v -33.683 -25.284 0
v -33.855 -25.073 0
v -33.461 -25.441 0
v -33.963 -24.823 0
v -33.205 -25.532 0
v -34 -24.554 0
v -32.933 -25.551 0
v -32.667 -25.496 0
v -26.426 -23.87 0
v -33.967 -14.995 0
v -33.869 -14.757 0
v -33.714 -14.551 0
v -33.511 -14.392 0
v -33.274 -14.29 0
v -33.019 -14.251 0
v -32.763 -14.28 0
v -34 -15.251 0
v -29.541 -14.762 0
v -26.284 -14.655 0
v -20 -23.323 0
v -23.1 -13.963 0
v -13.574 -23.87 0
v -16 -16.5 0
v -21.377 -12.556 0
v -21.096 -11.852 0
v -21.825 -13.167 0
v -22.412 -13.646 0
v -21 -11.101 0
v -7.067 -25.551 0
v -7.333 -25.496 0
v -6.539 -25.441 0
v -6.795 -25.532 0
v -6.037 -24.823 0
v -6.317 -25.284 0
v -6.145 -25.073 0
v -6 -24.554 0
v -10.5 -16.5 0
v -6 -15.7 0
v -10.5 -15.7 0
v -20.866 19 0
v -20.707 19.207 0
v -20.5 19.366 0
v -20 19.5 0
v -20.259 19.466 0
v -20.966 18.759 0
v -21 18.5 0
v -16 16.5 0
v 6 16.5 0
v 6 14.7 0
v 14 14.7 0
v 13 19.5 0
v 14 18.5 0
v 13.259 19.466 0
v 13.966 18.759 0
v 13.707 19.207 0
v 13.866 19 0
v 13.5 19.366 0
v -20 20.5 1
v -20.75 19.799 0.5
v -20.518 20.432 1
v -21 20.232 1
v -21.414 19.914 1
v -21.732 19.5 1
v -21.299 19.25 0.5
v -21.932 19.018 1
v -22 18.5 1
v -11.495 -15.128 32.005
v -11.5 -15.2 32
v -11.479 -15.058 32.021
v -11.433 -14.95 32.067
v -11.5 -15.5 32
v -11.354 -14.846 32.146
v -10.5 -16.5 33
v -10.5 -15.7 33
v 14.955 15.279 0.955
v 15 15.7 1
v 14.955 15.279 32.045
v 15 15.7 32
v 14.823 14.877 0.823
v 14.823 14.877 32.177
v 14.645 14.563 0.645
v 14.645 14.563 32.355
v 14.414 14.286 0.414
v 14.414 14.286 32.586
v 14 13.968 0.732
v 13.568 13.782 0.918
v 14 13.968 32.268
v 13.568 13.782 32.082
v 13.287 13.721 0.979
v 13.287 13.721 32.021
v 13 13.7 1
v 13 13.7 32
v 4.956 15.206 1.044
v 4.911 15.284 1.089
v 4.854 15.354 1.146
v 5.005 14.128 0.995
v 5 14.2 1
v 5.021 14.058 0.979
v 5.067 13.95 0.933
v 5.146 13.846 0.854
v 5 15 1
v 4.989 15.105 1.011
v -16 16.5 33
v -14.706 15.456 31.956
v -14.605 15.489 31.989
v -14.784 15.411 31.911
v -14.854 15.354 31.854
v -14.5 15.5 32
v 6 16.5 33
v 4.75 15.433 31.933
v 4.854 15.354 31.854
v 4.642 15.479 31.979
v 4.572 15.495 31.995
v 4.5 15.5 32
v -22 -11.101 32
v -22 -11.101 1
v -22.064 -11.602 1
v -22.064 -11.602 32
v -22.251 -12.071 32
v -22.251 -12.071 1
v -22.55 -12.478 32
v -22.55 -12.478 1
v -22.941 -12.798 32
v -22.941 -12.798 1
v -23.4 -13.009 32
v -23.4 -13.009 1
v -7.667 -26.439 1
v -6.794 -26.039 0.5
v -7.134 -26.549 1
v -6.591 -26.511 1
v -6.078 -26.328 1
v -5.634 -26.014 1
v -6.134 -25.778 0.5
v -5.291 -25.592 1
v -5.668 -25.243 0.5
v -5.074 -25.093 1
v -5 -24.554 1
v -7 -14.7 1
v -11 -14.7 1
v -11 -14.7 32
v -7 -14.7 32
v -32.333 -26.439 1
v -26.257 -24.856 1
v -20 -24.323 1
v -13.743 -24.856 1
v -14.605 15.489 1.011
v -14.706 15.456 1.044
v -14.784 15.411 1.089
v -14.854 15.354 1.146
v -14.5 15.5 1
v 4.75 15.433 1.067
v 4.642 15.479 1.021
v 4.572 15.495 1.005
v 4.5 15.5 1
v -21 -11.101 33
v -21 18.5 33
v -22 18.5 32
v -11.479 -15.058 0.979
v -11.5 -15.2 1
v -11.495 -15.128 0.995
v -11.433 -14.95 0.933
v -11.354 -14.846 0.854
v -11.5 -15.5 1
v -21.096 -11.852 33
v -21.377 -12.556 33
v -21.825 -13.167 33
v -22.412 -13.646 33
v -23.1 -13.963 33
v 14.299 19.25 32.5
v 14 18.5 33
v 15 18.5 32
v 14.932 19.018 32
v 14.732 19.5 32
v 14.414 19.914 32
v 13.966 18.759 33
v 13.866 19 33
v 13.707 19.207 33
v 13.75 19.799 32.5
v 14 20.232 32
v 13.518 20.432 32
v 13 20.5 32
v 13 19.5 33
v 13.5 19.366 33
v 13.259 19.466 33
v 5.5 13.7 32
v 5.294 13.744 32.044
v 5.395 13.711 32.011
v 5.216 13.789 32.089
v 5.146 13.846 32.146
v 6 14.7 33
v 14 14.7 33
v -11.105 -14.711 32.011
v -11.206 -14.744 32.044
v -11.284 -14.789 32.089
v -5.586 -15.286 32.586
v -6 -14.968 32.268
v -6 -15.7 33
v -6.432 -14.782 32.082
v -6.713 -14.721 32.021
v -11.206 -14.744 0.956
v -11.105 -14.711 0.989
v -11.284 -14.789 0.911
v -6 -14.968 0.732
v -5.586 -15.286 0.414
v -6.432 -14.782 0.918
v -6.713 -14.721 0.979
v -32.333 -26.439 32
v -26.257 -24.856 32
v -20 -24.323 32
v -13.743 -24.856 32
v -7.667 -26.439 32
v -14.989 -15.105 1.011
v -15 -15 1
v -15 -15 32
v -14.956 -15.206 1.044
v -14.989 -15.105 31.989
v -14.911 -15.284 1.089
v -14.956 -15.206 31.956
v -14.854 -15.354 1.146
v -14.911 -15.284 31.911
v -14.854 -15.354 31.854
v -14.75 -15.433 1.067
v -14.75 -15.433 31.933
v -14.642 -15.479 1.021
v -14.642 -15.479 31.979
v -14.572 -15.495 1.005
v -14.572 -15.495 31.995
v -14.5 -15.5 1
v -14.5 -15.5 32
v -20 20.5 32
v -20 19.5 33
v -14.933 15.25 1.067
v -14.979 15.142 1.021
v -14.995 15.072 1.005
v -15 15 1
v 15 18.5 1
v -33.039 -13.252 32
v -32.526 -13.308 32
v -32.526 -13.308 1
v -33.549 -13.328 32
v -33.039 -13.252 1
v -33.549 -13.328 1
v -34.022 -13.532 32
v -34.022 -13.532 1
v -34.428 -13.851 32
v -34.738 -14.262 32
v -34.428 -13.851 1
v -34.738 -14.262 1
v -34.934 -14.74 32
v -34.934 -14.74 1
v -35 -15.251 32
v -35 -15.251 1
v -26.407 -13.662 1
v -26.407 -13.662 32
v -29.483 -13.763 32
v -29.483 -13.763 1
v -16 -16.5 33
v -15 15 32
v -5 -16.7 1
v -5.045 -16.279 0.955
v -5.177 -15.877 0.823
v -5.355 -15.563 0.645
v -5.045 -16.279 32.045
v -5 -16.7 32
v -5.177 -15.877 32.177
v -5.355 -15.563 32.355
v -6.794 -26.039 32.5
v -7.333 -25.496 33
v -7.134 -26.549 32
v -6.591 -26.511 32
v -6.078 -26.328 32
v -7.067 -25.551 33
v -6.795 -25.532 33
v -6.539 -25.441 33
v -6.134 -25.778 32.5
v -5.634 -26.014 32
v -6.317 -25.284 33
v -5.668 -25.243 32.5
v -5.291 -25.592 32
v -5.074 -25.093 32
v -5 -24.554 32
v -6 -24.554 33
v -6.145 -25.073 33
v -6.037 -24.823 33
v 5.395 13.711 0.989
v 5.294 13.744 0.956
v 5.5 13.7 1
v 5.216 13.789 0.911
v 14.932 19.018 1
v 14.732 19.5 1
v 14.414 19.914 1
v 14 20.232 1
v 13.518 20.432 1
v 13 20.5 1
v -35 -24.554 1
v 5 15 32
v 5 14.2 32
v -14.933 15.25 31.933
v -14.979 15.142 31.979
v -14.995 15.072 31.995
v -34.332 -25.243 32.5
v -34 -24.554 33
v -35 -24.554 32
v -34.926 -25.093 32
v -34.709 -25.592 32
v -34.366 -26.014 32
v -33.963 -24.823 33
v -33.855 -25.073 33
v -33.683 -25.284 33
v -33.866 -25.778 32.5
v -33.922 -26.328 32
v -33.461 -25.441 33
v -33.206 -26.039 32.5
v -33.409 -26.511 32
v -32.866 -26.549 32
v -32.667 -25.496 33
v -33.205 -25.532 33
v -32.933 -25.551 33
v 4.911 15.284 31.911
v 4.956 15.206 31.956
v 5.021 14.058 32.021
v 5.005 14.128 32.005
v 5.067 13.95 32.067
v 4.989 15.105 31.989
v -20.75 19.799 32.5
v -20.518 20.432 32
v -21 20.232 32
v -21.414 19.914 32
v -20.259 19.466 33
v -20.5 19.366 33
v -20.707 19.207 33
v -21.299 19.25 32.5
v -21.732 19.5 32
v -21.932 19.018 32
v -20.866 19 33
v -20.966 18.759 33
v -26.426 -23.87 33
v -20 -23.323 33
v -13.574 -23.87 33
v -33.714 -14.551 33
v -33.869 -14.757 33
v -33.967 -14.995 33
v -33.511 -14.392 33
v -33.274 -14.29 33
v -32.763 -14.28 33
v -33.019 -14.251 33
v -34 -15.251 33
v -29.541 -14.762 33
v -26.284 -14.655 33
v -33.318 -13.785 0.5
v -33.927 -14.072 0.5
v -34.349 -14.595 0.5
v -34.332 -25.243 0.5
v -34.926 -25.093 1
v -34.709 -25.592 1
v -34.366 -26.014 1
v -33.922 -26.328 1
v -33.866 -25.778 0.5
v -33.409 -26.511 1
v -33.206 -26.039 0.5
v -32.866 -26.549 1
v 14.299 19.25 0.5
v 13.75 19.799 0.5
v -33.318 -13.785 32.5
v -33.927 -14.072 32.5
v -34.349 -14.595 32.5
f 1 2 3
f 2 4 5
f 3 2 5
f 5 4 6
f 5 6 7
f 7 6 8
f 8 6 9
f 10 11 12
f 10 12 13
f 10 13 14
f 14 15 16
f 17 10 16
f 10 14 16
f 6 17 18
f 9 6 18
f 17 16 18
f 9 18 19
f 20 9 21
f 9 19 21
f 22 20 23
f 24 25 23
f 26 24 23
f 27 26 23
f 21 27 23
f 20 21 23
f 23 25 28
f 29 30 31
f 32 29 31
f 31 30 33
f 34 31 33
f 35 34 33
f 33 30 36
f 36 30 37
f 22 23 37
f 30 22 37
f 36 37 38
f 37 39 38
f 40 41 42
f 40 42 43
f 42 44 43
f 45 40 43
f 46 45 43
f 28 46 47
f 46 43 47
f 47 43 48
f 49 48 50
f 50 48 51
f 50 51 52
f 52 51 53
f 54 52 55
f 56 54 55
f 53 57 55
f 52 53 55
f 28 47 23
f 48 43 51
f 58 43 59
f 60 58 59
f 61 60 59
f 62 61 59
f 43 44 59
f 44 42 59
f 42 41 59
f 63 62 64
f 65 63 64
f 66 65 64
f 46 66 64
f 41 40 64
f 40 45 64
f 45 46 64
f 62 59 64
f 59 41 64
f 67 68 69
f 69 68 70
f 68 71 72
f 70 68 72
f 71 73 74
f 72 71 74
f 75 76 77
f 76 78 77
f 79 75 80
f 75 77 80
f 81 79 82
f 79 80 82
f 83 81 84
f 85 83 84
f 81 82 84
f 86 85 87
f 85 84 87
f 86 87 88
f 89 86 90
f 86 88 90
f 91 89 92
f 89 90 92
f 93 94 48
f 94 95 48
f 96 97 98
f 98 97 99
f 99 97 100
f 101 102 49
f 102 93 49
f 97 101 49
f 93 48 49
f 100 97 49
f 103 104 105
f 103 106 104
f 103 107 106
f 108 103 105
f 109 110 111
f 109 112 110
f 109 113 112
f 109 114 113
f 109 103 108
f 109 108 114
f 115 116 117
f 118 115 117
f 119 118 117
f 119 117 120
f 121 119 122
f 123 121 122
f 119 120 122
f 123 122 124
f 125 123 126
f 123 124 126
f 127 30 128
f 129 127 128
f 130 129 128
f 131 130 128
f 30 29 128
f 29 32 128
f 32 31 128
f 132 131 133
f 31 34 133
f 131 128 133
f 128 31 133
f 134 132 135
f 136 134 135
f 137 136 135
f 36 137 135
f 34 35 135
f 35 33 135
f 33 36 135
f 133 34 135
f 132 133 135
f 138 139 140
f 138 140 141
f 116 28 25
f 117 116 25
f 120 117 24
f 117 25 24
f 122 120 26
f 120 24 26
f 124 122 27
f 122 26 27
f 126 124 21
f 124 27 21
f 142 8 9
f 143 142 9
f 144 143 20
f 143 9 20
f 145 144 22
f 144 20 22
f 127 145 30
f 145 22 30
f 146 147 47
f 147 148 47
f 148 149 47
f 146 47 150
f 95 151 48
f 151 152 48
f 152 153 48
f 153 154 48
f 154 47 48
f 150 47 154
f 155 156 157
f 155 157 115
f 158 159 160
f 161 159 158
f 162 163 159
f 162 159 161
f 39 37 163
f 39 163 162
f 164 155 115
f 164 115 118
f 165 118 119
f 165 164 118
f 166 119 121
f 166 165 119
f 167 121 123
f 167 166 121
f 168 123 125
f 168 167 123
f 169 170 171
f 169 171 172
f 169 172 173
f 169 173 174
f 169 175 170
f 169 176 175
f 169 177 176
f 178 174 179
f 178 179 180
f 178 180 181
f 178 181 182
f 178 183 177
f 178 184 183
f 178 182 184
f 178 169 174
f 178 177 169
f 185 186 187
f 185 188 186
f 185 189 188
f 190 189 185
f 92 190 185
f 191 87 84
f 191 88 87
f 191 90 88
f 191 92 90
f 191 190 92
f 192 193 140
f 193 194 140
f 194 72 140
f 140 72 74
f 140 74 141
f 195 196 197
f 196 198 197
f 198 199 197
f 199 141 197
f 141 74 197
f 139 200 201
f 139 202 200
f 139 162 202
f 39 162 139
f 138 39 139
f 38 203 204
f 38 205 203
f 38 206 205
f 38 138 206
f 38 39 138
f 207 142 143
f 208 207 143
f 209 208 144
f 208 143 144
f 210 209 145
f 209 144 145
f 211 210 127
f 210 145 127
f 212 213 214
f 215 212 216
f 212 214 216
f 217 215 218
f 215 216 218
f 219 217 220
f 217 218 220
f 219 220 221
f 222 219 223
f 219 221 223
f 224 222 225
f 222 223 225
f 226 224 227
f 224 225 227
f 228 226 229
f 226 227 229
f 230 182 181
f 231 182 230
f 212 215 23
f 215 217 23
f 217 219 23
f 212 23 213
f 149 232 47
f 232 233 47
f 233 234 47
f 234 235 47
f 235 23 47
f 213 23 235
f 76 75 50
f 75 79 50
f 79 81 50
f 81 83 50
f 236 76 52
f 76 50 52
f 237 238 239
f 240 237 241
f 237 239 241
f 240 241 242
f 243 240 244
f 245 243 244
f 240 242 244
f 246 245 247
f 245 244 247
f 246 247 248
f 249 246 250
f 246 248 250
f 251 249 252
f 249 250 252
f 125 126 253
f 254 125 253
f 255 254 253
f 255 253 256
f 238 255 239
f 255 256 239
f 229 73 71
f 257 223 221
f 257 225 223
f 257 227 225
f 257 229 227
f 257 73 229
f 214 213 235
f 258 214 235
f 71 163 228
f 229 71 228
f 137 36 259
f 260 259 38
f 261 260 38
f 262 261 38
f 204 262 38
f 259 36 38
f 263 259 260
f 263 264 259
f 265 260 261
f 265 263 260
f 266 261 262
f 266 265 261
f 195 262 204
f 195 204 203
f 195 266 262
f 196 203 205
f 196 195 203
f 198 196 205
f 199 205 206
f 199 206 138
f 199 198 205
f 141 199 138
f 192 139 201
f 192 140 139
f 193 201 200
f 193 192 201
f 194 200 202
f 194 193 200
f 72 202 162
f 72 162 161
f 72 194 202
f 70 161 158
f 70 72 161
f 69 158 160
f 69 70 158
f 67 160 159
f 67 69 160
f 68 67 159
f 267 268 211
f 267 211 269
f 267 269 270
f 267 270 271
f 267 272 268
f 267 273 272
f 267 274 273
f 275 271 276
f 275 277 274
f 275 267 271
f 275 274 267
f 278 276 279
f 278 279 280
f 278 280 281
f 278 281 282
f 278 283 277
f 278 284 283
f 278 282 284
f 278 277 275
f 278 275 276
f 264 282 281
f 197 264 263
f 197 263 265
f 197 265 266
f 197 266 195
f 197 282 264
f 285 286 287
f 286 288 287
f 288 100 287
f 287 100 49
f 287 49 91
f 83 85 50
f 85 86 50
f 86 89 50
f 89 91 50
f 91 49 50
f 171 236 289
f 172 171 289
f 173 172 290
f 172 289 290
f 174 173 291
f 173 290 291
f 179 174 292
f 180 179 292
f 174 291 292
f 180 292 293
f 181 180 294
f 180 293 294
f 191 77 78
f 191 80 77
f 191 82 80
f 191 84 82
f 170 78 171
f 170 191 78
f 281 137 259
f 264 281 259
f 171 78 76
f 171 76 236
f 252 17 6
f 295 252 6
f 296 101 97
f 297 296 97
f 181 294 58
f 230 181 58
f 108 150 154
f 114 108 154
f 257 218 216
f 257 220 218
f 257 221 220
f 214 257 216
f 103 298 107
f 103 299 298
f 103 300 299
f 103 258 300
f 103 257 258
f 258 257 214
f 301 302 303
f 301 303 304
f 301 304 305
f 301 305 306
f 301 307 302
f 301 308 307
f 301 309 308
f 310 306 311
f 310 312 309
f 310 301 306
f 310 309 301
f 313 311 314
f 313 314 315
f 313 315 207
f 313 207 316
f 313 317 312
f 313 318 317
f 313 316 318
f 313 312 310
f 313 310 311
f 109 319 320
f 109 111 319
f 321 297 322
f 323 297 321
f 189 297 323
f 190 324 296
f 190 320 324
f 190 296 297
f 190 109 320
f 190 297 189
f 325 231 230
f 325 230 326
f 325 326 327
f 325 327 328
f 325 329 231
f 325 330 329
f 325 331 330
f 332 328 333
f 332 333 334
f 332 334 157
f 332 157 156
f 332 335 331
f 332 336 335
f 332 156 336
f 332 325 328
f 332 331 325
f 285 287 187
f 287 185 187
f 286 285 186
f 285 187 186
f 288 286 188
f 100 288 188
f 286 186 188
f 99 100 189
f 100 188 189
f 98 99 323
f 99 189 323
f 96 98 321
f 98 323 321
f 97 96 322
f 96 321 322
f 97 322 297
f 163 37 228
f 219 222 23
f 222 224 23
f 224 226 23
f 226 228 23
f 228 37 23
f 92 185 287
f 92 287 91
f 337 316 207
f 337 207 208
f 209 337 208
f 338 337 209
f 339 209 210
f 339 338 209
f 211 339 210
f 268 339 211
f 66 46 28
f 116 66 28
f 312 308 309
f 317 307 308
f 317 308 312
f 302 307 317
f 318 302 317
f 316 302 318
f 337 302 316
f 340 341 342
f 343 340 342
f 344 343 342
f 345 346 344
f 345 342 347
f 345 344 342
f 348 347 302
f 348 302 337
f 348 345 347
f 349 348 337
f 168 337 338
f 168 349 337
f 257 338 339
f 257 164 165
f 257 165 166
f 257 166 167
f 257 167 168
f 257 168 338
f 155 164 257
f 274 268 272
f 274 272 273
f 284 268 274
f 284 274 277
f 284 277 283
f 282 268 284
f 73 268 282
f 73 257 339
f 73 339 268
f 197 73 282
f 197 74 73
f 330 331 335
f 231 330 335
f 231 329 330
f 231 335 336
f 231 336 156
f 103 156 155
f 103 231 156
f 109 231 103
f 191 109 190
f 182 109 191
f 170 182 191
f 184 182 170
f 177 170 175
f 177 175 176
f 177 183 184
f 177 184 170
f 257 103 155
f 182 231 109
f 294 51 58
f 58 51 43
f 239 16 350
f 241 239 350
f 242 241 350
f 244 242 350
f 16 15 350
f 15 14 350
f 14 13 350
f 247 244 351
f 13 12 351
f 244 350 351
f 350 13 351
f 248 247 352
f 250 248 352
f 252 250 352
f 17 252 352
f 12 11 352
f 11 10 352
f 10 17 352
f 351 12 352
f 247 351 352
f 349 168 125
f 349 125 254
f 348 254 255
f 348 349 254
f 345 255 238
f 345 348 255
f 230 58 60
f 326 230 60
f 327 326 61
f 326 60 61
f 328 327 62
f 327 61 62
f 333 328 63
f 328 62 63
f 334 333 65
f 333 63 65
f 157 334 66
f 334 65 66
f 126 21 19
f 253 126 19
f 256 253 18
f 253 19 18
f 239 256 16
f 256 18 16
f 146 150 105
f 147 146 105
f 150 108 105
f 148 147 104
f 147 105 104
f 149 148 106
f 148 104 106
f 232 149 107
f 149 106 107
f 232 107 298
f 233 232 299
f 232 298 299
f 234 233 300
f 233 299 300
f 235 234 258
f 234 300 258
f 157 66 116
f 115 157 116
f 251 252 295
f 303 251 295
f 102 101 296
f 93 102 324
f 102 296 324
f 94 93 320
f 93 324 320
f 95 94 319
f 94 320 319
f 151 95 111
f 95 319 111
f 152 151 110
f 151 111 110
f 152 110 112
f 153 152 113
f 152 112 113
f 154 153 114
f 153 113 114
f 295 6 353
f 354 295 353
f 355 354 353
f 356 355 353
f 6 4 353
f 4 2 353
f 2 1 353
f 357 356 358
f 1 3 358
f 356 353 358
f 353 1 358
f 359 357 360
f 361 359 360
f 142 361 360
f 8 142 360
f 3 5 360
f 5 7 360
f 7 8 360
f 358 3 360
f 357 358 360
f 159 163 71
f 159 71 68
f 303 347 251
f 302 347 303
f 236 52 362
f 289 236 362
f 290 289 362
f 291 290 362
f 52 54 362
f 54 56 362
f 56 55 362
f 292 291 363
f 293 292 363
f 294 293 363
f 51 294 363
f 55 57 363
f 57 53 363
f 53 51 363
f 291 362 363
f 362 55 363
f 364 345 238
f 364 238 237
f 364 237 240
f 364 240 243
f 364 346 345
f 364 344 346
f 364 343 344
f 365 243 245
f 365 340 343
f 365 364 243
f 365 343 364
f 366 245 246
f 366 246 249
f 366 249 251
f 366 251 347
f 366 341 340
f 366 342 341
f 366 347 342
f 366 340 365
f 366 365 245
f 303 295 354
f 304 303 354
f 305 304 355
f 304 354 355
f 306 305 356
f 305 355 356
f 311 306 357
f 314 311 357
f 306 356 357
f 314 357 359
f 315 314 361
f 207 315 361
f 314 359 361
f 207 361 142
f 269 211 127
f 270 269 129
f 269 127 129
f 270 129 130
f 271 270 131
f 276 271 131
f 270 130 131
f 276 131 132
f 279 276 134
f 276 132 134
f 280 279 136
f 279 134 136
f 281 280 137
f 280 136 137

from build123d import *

# Parameters (mm, degrees)
F0_W     = 6.5
F0_H     = 0.8
F1_DEPTH = 33
F2_SIZE  = 1
F3_R     = 2
F4_R     = 0.5


with BuildPart() as f1:
    # F0 (on Top) → F1 (new body)
    with BuildSketch(Plane.XY):
        with BuildLine():
            Line((-5, -24.553516), (-5, -15.5))
            Line((-5, -15.5), (-11.5, -15.5))
            Line((-11.5, -15.5), (-15, -15.5))
            Line((-15, -15.5), (-15, 15.5))
            Line((-15, 15.5), (5, 15.5))
            Line((5, 15.5), (5, 13.7))
            Line((5, 13.7), (15, 13.7))
            Line((15, 13.7), (15, 15.5))
            Line((15, 15.5), (15, 18.5))
            ThreePointArc((15, 18.5), (14.414214, 19.914214), (13, 20.5))
            Line((13, 20.5), (-20, 20.5))
            ThreePointArc((-20, 20.5), (-21.414214, 19.914214), (-22, 18.5))
            Line((-22, 18.5), (-22, -11.10081))
            ThreePointArc((-22, -11.10081), (-22.387548, -12.284026), (-23.4, -13.008688))
            ThreePointArc((-23.4, -13.008688), (-27.942683, -13.782584), (-32.526316, -13.308041))
            ThreePointArc((-32.526316, -13.308041), (-34.235442, -13.678342), (-35, -15.251137))
            Line((-35, -15.251137), (-35, -18.432774))
            Line((-35, -18.432774), (-35, -24.553516))
            ThreePointArc((-35, -24.553516), (-34.154701, -26.18651), (-32.333333, -26.439135))
            ThreePointArc((-32.333333, -26.439135), (-20, -24.323069), (-7.666667, -26.439135))
            ThreePointArc((-7.666667, -26.439135), (-5.845299, -26.18651), (-5, -24.553516))
        make_face()
        with Locations((-8.25, -15.1)):
            Rectangle(F0_W, F0_H)
    extrude(amount=F1_DEPTH)

    # F2
    f2_edges = [f1.edges().sort_by_distance(p)[0] for p in [
        (-20, -24.323069, 33),
        (-5.845299, -26.18651, 33),
        (-5, -19.626758, 33),
        (-8.25, -14.7, 33),
        (-11.5, -15.1, 33),
        (-13.25, -15.5, 33),
        (-15, 0, 33),
        (-5, 15.5, 33),
        (5, 14.6, 33),
        (10, 13.7, 33),
        (15, 16.1, 33),
        (14.414214, 19.914214, 33),
        (-3.5, 20.5, 33),
        (-21.414214, 19.914214, 33),
        (-22, 3.699595, 33),
        (-22.387548, -12.284026, 33),
        (-27.942683, -13.782584, 33),
        (-34.235442, -13.678342, 33),
        (-35, -19.902327, 33),
        (-34.154701, -26.18651, 33),
        (-20, -24.323069, 0),
        (-5.845299, -26.18651, 0),
        (-5, -19.626758, 0),
        (-8.25, -14.7, 0),
        (-11.5, -15.1, 0),
        (-13.25, -15.5, 0),
        (-15, 0, 0),
        (-5, 15.5, 0),
        (5, 14.6, 0),
        (10, 13.7, 0),
        (15, 16.1, 0),
        (14.414214, 19.914214, 0),
        (-3.5, 20.5, 0),
        (-21.414214, 19.914214, 0),
        (-22, 3.699595, 0),
        (-22.387548, -12.284026, 0),
        (-27.942683, -13.782584, 0),
        (-34.235442, -13.678342, 0),
        (-35, -19.902327, 0),
        (-34.154701, -26.18651, 0),
    ]]
    chamfer(f2_edges, length=F2_SIZE)

    # F3
    f3_edges = [f1.edges().sort_by_distance(p)[0] for p in [
        (-5, -14.7, 16.5),
        (15, 13.7, 16.5),
    ]]
    fillet(f3_edges, radius=F3_R)

    # F4
    f4_edges = [f1.edges().sort_by_distance(p)[0] for p in [
        (-11.5, -14.7, 16.5),
        (-15, -15.5, 16.5),
        (-15, 15.5, 16.5),
        (5, 13.7, 16.5),
        (5, 15.5, 16.5),
    ]]
    fillet(f4_edges, radius=F4_R)


solid = f1.part
